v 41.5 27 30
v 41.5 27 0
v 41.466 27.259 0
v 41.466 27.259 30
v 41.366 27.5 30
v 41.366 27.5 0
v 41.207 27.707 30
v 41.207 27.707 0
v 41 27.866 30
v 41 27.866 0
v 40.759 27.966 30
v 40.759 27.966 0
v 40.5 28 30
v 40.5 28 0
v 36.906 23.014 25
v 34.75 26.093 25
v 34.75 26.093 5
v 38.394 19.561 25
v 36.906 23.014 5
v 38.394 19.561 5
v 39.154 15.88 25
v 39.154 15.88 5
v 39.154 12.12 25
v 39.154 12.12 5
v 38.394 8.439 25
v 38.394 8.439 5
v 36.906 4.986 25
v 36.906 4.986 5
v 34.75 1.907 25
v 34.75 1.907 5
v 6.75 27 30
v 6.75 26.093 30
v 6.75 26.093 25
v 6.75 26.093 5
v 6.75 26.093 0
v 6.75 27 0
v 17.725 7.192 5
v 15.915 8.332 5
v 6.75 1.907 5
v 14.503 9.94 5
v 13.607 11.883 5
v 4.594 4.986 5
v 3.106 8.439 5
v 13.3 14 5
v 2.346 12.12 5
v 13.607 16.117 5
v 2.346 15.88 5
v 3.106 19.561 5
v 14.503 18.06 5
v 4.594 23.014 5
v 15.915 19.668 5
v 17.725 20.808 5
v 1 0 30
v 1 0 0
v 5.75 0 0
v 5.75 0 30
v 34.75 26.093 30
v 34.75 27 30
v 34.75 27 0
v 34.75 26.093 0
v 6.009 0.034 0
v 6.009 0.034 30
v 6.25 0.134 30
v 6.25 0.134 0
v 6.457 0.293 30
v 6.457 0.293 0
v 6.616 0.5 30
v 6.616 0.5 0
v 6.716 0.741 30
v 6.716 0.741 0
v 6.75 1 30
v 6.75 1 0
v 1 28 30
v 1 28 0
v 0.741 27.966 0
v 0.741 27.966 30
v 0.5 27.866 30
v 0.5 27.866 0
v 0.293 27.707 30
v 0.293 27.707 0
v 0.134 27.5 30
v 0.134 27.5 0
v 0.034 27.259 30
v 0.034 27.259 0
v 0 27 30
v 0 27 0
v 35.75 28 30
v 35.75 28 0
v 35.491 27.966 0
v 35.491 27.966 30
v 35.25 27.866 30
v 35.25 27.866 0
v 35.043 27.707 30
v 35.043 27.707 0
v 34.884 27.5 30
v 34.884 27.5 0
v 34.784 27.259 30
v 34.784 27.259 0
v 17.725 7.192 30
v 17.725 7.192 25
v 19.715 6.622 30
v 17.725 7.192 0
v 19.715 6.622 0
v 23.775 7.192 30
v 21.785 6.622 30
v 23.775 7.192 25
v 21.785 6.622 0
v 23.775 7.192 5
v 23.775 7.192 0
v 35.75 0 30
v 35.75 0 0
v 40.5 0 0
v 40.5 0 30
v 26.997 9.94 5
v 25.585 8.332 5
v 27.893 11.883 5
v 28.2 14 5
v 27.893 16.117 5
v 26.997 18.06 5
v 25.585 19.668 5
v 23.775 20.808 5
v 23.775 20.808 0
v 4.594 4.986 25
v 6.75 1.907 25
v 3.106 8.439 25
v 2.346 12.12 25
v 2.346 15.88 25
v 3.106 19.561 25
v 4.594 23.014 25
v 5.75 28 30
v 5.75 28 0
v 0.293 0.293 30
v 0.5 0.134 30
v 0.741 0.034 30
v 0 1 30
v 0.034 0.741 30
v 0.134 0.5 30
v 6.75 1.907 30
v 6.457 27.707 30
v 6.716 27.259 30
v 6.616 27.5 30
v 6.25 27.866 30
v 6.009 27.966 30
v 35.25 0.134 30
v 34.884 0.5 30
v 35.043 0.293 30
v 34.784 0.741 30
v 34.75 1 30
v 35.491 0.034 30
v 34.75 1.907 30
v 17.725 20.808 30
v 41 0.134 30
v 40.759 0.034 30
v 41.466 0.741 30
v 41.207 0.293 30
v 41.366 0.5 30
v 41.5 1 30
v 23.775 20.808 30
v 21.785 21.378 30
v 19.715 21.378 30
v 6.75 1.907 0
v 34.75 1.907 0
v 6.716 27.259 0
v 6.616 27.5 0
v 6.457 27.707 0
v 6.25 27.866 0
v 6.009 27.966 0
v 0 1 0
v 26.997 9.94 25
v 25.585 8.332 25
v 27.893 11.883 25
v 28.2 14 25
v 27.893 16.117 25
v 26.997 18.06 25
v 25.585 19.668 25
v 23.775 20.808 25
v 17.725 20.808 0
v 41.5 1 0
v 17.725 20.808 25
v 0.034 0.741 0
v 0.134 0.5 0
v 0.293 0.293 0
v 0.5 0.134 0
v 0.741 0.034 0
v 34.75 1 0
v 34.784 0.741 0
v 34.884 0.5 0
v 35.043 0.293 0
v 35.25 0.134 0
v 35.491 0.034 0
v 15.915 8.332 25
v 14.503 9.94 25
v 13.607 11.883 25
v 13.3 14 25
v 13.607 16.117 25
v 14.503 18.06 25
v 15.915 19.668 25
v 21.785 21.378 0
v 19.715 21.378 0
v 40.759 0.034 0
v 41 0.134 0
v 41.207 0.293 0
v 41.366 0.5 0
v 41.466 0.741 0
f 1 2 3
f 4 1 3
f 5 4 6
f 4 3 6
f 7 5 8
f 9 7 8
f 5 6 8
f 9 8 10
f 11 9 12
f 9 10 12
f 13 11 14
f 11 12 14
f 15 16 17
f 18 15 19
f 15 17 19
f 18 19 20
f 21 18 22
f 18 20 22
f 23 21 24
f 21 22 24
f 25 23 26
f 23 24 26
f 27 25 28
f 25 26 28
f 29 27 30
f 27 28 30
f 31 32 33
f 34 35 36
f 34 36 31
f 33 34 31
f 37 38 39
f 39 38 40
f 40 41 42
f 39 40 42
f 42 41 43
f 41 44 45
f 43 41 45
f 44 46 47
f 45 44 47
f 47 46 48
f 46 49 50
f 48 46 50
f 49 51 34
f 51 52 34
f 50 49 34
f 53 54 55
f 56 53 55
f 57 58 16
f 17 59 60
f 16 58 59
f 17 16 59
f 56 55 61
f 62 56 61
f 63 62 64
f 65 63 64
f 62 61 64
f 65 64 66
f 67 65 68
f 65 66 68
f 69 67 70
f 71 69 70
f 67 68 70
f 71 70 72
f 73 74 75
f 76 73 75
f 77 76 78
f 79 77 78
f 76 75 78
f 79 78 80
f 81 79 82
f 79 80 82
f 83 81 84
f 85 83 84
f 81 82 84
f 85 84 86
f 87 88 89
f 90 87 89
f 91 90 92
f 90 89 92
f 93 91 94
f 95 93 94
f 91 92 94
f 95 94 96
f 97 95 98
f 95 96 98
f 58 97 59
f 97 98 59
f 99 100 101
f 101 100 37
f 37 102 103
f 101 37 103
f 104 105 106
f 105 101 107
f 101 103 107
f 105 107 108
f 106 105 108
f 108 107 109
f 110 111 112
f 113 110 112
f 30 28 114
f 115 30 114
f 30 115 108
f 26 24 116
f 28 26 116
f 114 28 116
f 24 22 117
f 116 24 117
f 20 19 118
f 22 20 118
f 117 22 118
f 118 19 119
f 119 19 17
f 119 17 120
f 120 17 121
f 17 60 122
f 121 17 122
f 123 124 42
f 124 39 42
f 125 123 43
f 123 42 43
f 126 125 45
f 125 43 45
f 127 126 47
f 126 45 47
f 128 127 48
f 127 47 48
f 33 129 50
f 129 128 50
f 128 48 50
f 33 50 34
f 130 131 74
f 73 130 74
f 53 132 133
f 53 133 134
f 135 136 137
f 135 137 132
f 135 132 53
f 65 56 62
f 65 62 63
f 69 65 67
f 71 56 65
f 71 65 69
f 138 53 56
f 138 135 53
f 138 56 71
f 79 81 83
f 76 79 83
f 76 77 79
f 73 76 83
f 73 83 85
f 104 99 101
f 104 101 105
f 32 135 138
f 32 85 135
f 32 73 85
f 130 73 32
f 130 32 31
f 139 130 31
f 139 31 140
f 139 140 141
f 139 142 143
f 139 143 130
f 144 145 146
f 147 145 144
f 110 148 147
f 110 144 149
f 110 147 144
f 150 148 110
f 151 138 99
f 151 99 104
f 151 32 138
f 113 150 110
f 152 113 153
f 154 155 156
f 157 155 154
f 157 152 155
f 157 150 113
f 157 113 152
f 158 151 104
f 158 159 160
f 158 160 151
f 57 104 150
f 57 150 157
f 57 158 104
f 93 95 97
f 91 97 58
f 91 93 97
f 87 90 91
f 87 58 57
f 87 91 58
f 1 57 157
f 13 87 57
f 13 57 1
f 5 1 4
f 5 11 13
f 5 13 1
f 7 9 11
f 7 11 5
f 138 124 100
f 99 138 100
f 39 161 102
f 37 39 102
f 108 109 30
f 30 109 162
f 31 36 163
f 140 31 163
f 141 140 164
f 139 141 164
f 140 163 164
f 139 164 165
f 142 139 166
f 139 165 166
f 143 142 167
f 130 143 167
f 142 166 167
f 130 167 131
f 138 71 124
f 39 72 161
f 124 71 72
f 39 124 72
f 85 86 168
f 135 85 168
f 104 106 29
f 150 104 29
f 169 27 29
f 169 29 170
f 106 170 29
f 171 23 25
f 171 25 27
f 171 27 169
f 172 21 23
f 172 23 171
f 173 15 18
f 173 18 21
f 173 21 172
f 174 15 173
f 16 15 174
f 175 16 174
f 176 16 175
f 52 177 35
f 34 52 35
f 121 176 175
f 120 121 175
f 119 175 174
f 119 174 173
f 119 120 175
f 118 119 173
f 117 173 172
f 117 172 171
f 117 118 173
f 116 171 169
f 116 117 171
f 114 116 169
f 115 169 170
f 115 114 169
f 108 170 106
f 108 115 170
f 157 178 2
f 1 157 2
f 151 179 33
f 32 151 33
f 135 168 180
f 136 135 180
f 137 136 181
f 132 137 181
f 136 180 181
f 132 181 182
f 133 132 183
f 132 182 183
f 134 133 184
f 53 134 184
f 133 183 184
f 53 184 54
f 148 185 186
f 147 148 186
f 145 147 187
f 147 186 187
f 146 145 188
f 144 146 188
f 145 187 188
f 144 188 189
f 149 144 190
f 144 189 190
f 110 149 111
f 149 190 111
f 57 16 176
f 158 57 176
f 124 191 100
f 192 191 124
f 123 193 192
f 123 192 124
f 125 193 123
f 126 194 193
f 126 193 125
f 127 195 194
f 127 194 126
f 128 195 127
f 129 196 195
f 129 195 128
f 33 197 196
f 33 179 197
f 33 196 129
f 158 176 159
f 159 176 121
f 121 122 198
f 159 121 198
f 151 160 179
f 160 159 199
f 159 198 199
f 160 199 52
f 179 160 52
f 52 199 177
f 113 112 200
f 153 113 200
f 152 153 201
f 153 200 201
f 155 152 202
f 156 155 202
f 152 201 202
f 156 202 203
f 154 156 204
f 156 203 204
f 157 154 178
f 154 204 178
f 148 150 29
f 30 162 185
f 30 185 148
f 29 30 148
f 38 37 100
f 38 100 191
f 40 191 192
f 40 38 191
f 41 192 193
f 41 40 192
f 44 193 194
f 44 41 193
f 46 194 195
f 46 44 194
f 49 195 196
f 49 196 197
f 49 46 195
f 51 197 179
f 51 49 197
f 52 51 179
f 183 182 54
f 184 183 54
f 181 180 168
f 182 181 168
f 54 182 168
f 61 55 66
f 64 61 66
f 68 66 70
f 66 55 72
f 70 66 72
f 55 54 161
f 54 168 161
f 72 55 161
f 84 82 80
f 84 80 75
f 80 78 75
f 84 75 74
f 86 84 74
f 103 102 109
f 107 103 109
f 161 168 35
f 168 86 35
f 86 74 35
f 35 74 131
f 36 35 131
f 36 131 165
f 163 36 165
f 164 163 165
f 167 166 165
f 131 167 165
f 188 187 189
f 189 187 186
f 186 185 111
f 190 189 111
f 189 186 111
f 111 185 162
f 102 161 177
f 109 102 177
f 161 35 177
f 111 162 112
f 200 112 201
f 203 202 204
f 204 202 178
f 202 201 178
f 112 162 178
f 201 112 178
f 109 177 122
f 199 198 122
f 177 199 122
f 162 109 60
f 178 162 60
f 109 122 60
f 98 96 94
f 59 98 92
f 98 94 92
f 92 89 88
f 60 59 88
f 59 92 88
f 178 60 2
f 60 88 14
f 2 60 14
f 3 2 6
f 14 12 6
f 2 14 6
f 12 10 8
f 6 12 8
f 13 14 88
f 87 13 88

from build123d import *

# Parameters (mm, degrees)
BOSS_EXTRUDE2_DEPTH = 30
CUT_EXTRUDE1_START  = -5
SKETCH4_R           = 18.5
SKETCH4_R_2         = 7.45
CUT_EXTRUDE1_DEPTH  = 20


with BuildPart() as part:
    # Sketch1 → Boss-Extrude2 (new body)
    with BuildSketch(Plane.XY):
        with BuildLine():
            ThreePointArc((0, 1), (0.292893219, 0.292893219), (1, 0))
            Line((1, 0), (5.75, 0))
            ThreePointArc((5.75, 0), (6.457106781, 0.292893219), (6.75, 1))
            Line((6.75, 1), (6.75, 1.906613378))
            Line((6.75, 1.906613378), (17.725, 7.191778867))
            ThreePointArc((17.725, 7.191778867), (13.3, 14), (17.725, 20.808221133))
            Line((17.725, 20.808221133), (6.75, 26.093386622))
            Line((6.75, 26.093386622), (6.75, 27))
            ThreePointArc((6.75, 27), (6.457106781, 27.707106781), (5.75, 28))
            Line((5.75, 28), (1, 28))
            ThreePointArc((1, 28), (0.292893219, 27.707106781), (0, 27))
            Line((0, 27), (0, 1))
        make_face()
        with BuildLine():
            ThreePointArc((17.725, 20.808221133), (13.3, 14), (17.725, 7.191778867))
            ThreePointArc((17.725, 7.191778867), (20.75, 6.55), (23.775, 7.191778867))
            ThreePointArc((23.775, 7.191778867), (26.996549047, 9.940058498), (28.2, 14))
            ThreePointArc((28.2, 14), (26.996549047, 18.059941502), (23.775, 20.808221133))
            ThreePointArc((23.775, 20.808221133), (20.75, 21.45), (17.725, 20.808221133))
        make_face()
        with BuildLine():
            ThreePointArc((28.2, 14), (26.996549047, 9.940058498), (23.775, 7.191778867))
            Line((23.775, 7.191778867), (34.75, 1.906613378))
            Line((34.75, 1.906613378), (34.75, 1))
            ThreePointArc((34.75, 1), (35.042893219, 0.292893219), (35.75, 0))
            Line((35.75, 0), (40.5, 0))
            ThreePointArc((40.5, 0), (41.207106781, 0.292893219), (41.5, 1))
            Line((41.5, 1), (41.5, 27))
            ThreePointArc((41.5, 27), (41.207106781, 27.707106781), (40.5, 28))
            Line((40.5, 28), (35.75, 28))
            ThreePointArc((35.75, 28), (35.042893219, 27.707106781), (34.75, 27))
            Line((34.75, 27), (34.75, 26.093386622))
            Line((34.75, 26.093386622), (23.775, 20.808221133))
            ThreePointArc((23.775, 20.808221133), (26.996549047, 18.059941502), (28.2, 14))
        make_face()
    extrude(amount=BOSS_EXTRUDE2_DEPTH)

    # Sketch4 → Cut-Extrude1 (cut)
    with BuildSketch(Plane(origin=(0, 0, 0), x_dir=(-1, 0, 0), z_dir=(0, 0, -1)).offset(CUT_EXTRUDE1_START)):
        with Locations((-20.75, 14)):
            Circle(SKETCH4_R)
        with Locations(Location((-20.75, 14, 0), (0, 0, 293.956332154))):
            Circle(SKETCH4_R_2, mode=Mode.SUBTRACT)
    extrude(amount=-CUT_EXTRUDE1_DEPTH, mode=Mode.SUBTRACT)


solid = part.part
